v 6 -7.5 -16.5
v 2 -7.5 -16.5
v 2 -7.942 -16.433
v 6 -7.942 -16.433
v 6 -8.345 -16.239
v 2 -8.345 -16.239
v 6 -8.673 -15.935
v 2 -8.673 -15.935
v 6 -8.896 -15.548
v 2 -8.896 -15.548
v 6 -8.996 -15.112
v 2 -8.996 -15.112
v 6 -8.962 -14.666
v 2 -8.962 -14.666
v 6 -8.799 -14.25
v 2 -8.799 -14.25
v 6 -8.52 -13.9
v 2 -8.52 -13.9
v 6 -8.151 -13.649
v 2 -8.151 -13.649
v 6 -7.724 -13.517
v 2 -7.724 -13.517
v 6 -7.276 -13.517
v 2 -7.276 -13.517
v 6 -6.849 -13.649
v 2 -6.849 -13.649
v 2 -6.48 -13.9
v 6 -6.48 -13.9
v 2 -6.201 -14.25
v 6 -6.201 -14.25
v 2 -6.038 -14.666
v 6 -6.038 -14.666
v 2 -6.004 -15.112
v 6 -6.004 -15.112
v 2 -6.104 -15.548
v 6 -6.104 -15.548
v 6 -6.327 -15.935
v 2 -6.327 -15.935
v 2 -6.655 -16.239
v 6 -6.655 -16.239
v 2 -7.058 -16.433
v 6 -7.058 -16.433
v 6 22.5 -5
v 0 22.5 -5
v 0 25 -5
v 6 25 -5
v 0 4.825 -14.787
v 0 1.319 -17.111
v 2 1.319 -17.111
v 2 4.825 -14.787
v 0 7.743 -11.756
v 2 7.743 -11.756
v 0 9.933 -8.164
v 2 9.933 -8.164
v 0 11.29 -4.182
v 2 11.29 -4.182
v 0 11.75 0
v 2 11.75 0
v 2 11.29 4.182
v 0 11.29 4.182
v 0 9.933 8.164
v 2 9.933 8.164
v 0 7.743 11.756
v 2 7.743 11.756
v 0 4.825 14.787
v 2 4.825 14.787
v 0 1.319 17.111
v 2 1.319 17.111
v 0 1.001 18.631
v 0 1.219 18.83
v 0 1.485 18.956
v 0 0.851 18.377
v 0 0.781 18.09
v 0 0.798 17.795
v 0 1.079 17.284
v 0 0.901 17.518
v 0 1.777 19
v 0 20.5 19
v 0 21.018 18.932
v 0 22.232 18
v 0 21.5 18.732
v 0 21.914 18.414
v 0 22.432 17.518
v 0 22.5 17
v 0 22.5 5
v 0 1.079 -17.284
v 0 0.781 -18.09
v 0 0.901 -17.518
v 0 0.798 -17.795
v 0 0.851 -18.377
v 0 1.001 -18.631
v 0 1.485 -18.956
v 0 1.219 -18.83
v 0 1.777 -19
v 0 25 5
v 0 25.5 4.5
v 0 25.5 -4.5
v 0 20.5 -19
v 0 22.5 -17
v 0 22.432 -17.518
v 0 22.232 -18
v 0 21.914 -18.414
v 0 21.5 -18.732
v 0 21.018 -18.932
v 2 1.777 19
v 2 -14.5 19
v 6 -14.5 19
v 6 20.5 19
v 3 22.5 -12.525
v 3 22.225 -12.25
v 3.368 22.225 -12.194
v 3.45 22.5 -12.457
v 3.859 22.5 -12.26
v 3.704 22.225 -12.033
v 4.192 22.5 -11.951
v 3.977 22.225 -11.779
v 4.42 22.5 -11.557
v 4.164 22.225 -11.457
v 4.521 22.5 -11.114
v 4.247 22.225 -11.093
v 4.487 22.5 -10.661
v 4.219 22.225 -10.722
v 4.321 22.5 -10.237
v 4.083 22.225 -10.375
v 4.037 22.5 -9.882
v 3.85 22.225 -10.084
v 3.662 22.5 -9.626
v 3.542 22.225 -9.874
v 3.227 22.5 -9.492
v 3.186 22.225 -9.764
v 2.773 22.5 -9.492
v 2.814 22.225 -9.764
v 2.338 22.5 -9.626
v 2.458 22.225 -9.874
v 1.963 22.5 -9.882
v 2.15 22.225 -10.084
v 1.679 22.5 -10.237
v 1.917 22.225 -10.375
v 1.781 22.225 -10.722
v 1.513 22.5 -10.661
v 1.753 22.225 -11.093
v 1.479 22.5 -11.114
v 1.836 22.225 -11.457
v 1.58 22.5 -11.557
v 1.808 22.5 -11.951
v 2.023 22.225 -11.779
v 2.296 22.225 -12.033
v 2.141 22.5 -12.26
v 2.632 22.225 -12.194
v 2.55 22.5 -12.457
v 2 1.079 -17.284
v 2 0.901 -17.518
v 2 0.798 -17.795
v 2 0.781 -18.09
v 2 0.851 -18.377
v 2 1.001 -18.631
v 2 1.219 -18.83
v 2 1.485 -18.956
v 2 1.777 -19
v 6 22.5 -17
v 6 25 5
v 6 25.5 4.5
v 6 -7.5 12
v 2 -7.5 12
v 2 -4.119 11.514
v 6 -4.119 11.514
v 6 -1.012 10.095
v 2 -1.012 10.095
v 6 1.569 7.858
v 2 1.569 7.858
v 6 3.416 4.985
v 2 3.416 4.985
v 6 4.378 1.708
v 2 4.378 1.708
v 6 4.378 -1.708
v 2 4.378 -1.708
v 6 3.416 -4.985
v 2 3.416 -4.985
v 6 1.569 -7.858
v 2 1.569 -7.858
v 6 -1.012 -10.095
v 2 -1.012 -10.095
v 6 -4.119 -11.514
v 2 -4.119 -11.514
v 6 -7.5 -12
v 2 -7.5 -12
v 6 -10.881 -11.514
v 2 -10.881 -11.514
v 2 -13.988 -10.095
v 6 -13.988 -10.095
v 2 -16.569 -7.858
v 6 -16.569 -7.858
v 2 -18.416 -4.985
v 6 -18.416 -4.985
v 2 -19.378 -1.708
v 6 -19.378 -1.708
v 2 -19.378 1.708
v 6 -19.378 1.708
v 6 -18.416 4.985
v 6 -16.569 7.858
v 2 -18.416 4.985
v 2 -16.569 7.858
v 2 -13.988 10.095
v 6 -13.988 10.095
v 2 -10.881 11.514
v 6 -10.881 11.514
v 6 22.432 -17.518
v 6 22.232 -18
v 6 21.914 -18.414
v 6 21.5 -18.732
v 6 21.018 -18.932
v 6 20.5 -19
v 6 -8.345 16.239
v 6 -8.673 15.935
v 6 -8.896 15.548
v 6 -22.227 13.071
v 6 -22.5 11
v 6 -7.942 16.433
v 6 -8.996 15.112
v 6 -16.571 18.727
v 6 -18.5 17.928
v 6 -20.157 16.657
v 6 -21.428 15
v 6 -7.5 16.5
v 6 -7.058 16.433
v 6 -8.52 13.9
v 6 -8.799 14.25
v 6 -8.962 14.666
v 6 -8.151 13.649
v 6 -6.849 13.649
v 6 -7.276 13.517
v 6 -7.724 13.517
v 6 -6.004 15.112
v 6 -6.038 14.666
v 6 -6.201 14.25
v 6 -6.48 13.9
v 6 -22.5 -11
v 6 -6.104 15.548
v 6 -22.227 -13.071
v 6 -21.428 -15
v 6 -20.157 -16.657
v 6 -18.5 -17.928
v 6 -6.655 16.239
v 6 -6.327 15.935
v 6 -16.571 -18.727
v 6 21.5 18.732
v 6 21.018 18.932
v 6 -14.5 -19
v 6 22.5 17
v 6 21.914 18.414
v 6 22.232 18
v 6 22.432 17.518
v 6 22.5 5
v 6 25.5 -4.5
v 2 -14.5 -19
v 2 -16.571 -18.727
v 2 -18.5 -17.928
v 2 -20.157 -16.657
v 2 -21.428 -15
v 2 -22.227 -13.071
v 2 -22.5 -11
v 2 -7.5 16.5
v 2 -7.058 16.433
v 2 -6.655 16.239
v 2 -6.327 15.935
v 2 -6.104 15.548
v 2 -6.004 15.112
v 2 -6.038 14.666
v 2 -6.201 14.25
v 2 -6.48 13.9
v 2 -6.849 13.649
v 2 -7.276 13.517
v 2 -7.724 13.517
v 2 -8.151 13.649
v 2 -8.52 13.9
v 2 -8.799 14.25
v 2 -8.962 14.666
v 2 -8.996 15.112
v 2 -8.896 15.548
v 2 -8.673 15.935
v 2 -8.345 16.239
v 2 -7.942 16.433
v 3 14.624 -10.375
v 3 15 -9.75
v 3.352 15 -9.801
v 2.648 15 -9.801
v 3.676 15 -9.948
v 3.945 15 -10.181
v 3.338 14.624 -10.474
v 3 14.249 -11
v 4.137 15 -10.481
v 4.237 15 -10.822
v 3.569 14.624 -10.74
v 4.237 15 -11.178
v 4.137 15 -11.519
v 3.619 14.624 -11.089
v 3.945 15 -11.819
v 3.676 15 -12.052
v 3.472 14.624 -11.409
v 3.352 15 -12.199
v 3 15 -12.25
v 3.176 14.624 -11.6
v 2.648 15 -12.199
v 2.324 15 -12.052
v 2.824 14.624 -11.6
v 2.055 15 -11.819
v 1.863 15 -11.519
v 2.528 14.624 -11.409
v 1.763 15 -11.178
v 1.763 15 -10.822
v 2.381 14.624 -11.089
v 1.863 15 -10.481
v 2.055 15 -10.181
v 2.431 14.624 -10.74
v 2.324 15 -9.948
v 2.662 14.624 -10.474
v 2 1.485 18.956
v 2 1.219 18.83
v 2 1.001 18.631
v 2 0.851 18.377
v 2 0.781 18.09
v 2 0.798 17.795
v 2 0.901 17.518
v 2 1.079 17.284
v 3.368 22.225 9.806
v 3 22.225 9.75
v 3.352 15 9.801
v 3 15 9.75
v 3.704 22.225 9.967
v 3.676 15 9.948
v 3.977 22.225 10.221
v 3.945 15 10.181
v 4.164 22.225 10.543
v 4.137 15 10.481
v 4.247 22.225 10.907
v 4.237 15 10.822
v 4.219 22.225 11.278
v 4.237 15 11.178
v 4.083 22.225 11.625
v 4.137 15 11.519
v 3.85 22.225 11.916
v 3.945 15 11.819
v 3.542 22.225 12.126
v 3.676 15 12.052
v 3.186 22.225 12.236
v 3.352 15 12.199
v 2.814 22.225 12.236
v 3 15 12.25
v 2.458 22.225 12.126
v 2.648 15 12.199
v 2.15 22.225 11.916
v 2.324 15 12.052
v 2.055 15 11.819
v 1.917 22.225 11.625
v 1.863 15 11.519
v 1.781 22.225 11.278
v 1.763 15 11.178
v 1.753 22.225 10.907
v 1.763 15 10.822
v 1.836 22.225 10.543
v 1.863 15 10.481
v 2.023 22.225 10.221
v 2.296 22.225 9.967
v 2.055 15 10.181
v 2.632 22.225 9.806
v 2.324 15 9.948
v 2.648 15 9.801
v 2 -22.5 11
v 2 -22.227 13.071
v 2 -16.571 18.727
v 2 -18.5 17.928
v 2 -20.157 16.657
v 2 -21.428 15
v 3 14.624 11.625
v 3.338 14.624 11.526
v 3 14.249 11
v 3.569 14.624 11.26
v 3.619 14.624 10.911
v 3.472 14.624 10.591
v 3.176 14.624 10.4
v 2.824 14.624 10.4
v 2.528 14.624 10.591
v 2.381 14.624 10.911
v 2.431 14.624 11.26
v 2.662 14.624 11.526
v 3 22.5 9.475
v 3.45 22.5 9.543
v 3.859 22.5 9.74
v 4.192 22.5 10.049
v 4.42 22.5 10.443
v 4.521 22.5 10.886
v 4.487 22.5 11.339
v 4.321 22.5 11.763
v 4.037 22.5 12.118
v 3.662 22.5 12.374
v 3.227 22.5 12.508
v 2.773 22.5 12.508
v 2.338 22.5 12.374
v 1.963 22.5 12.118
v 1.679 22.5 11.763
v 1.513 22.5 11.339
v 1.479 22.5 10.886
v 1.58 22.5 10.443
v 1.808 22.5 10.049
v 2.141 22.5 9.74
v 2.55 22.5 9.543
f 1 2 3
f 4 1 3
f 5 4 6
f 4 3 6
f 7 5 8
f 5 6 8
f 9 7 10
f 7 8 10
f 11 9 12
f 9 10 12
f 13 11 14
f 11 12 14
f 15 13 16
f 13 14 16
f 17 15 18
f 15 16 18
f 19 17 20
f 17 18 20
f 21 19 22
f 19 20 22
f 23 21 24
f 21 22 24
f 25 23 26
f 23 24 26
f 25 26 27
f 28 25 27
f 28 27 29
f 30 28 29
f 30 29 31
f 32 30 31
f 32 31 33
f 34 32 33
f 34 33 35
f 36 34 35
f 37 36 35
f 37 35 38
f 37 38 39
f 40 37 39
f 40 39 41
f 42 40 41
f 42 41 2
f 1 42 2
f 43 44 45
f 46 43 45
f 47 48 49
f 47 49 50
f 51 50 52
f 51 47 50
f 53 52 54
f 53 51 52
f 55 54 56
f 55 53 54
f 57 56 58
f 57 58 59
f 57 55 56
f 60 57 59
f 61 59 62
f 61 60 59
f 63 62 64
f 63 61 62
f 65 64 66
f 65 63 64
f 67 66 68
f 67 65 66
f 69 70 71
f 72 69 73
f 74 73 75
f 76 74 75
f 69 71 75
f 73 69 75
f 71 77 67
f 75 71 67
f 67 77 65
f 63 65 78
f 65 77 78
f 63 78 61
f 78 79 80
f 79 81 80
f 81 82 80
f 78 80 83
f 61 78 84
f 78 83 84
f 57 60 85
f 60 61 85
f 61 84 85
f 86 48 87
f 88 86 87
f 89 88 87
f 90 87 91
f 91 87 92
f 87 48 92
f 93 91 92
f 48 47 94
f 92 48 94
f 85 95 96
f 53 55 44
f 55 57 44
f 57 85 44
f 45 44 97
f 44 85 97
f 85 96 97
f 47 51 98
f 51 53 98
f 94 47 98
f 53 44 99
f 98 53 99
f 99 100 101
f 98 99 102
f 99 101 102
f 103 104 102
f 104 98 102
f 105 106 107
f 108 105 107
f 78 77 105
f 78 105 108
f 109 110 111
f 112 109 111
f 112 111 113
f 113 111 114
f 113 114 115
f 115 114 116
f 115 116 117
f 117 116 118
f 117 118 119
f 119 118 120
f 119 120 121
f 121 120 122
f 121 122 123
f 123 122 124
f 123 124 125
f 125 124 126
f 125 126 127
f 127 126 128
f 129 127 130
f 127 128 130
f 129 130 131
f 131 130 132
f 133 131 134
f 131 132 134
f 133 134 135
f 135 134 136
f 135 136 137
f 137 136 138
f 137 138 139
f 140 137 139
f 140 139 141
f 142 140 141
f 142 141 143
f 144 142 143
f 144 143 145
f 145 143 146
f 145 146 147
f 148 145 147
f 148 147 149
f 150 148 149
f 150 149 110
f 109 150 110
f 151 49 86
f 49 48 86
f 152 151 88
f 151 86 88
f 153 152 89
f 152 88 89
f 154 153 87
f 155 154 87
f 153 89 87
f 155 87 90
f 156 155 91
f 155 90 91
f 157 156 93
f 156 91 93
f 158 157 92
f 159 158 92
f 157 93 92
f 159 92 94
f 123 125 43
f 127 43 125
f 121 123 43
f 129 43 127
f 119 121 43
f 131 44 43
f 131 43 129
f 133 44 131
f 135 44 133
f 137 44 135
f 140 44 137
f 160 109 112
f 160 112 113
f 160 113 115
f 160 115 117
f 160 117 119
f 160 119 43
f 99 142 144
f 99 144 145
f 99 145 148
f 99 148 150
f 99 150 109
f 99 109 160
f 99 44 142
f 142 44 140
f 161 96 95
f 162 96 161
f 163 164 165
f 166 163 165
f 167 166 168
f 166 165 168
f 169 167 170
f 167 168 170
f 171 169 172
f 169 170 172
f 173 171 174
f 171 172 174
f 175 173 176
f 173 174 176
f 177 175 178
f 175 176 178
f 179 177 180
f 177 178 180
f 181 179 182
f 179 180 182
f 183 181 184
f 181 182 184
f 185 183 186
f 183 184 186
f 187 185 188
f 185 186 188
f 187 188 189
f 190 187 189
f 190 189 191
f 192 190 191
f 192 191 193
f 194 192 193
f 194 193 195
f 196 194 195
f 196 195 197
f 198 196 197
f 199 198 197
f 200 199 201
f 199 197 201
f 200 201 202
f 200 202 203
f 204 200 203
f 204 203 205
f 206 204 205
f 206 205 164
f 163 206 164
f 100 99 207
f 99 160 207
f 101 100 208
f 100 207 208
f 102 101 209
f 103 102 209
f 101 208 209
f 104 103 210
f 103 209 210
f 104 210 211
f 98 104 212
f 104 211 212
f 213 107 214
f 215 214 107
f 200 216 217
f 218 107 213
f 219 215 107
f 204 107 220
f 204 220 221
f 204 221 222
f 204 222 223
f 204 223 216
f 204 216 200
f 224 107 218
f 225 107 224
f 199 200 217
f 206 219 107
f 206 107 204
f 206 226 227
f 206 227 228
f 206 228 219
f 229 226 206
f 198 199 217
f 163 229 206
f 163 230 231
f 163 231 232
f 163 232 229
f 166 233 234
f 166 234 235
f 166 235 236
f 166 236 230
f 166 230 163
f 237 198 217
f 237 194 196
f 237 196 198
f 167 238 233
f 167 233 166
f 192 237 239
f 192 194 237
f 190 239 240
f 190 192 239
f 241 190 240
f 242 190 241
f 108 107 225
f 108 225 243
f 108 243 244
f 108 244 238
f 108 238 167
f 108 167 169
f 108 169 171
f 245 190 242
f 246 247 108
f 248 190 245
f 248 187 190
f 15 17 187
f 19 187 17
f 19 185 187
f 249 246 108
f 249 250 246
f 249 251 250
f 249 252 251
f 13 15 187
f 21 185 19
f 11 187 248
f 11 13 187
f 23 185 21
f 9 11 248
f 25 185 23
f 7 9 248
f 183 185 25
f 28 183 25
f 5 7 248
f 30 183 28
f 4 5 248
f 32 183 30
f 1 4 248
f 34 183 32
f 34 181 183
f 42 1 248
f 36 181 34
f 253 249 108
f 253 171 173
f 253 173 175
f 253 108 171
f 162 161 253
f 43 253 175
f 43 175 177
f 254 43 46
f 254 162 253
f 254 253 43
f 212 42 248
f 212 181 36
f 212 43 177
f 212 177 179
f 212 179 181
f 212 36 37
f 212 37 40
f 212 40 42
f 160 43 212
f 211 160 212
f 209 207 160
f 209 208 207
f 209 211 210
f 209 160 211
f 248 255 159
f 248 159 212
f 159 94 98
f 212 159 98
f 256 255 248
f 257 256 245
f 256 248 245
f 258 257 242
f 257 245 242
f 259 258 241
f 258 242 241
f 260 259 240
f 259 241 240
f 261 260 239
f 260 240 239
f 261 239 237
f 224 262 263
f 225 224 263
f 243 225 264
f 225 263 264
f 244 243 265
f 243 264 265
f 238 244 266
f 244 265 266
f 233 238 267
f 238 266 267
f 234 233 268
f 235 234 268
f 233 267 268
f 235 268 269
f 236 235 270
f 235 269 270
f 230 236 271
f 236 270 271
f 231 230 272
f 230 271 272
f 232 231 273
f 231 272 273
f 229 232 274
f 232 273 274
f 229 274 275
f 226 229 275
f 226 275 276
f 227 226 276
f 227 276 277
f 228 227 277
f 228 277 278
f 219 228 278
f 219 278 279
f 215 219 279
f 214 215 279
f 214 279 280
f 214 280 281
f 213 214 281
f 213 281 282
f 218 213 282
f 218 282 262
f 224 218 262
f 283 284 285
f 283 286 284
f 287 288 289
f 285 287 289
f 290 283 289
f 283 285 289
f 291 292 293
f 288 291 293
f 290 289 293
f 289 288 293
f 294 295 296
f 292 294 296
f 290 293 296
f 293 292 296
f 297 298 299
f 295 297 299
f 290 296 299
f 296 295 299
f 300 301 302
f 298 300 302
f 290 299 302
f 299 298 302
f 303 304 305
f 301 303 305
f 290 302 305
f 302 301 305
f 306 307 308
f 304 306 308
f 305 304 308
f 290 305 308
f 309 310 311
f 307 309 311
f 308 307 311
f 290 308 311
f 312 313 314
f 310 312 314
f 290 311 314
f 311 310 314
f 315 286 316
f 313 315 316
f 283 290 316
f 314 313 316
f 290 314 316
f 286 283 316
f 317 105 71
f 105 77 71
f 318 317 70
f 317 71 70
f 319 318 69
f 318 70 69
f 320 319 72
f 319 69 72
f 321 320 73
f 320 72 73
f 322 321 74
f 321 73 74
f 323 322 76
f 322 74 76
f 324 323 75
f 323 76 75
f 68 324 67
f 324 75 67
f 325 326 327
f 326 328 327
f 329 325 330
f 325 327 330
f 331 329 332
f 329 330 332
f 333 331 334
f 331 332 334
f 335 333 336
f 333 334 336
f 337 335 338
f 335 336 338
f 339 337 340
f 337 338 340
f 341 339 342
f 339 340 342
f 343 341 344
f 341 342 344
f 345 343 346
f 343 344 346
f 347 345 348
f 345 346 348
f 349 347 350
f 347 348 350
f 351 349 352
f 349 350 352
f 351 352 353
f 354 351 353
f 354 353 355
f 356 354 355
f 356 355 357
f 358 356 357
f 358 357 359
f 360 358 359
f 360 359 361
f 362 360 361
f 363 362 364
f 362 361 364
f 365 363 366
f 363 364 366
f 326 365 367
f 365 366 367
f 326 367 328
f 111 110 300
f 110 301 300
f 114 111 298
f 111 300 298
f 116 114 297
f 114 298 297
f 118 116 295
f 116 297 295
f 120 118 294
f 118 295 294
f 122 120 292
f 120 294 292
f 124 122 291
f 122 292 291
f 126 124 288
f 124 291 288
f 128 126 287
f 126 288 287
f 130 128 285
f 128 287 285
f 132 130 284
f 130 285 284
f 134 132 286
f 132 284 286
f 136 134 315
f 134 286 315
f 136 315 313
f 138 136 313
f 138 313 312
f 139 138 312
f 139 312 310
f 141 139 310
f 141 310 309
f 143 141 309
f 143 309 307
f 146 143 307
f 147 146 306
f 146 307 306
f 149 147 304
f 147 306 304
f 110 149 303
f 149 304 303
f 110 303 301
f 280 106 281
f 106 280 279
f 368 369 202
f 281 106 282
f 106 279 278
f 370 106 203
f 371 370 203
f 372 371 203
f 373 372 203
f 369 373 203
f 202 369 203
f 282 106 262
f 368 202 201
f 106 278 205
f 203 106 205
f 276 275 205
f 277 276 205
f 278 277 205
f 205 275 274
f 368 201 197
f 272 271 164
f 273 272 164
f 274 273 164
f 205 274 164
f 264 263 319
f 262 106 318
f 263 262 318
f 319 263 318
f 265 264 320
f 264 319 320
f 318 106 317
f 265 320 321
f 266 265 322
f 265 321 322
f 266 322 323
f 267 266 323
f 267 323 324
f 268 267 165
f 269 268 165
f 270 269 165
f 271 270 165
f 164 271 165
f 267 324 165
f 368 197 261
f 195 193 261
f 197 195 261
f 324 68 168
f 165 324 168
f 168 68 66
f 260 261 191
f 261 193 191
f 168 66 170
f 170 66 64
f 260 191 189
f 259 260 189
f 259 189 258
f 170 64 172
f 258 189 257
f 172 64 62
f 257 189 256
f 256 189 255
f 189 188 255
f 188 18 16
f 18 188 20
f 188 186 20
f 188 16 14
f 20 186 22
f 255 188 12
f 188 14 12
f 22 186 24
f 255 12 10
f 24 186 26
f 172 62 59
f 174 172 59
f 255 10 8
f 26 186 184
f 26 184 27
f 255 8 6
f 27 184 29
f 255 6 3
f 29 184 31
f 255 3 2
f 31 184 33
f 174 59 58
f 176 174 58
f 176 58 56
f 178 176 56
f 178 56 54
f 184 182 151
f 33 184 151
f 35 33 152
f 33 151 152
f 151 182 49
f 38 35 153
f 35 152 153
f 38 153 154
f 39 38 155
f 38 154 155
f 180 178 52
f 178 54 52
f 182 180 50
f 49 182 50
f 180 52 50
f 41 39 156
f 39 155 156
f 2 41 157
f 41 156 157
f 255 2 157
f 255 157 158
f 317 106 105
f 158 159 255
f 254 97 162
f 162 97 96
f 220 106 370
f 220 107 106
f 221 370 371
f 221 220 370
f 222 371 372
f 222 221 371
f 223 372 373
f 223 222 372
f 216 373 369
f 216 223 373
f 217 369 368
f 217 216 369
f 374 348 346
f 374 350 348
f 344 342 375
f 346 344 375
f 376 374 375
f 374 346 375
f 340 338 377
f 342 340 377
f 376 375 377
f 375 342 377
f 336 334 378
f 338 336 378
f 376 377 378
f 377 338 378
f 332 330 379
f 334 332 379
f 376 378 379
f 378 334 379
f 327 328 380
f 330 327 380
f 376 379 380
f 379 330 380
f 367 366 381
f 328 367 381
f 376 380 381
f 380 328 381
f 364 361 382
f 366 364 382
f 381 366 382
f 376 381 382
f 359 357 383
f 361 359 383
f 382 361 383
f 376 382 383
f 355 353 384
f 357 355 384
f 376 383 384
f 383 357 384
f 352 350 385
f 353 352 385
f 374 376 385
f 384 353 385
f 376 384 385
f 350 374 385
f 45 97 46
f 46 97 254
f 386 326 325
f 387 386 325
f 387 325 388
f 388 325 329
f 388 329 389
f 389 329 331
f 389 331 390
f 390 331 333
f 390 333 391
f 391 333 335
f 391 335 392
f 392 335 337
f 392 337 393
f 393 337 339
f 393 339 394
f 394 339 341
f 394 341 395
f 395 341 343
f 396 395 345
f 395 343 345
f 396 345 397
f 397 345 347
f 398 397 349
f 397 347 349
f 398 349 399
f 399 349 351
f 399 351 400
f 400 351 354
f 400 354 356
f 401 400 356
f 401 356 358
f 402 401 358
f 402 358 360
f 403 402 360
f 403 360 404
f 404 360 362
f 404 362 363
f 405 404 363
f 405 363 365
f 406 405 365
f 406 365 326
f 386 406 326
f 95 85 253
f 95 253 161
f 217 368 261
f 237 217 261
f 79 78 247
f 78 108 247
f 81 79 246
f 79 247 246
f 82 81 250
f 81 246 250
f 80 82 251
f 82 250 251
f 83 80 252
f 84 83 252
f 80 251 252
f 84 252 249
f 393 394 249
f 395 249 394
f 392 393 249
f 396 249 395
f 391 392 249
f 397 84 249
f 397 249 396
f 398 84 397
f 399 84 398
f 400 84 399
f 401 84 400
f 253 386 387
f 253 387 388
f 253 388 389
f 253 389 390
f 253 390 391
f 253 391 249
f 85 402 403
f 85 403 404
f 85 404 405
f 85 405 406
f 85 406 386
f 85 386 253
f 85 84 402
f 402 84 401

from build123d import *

# Parameters (mm, degrees)
SKETCH_1_W                   = 38
SKETCH_1_H                   = 45
EXTRUDE_1_DEPTH              = 6
SKETCH_2_R                   = 12
SKETCH_2_R_2                 = 1.5
CUT_EXTRUDE_1_DEPTH          = 31.054117854
CUT_EXTRUDE_2_DEPTH          = 2
FILLET_2_R                   = 1
FILLET_3_R                   = 8
FILLET_4_R                   = 2
SKETCH_4_W                   = 10
SKETCH_4_H                   = 3
EXTRUDE_2_DEPTH              = 6
CHAMFER_1_SIZE               = 0.5
HOLE_WIZARD_M3_1_D           = 2.5
HOLE_WIZARD_M3_1_DEPTH       = 7.5
HOLE_WIZARD_M3_1_CSINK_D     = 3.05
HOLE_WIZARD_M3_1_CSINK_ANGLE = 90
HOLE_WIZARD_M3_1_TIP         = 0.751075774


with BuildPart() as part:
    # 草图1 → 凸台-拉伸1 (new body)
    with BuildSketch(Plane(origin=(0, 0, 0), x_dir=(0, 0, -1), z_dir=(1, 0, 0))):
        Rectangle(SKETCH_1_W, SKETCH_1_H)
    extrude(amount=EXTRUDE_1_DEPTH)

    # 草图2 → 切除-拉伸1 (cut, through all)
    with BuildSketch(Plane.ZY):
        with Locations((0, -7.5)):
            Circle(SKETCH_2_R)
        with Locations((15, -7.5)):
            Circle(SKETCH_2_R_2)
        with Locations(Location((-15, -7.5, 0), (0, 0, 180))):
            Circle(SKETCH_2_R_2)
    extrude(amount=-CUT_EXTRUDE_1_DEPTH, mode=Mode.SUBTRACT)

    # 草图3 → 切除-拉伸2 (cut)
    with BuildSketch(Plane.ZY):
        with BuildLine():
            Line((19.25, -7.5), (19.25, -22.5))
            Line((19.25, -22.5), (-19.25, -22.5))
            Line((-19.25, -22.5), (-19.25, -7.5))
            ThreePointArc((-19.25, -7.5), (0, 11.75), (19.25, -7.5))
        make_face()
    extrude(amount=-CUT_EXTRUDE_2_DEPTH, mode=Mode.SUBTRACT)

    # 圆角2
    fillet_2_edges = [part.edges().sort_by_distance(p)[0] for p in [
        (1, -4.407670781, -19),
        (1, -4.407670781, 19),
    ]]
    fillet(fillet_2_edges, radius=FILLET_2_R)

    # 圆角3
    fillet_3_edges = [part.edges().sort_by_distance(p)[0] for p in [
        (4, -22.5, -19),
        (4, -22.5, 19),
    ]]
    fillet(fillet_3_edges, radius=FILLET_3_R)

    # 圆角4
    fillet_4_edges = [part.edges().sort_by_distance(p)[0] for p in [
        (3, 22.5, 19),
        (3, 22.5, -19),
    ]]
    fillet(fillet_4_edges, radius=FILLET_4_R)

    # 草图4 → 凸台-拉伸2 (add)
    with BuildSketch(Plane.ZY):
        with Locations((0, 24)):
            Rectangle(SKETCH_4_W, SKETCH_4_H)
    extrude(amount=-EXTRUDE_2_DEPTH)

    # 倒角1
    chamfer_1_edges = [part.edges().sort_by_distance(p)[0] for p in [
        (3, 25.5, 5),
        (3, 25.5, -5),
    ]]
    chamfer(chamfer_1_edges, length=CHAMFER_1_SIZE)

    # M3 螺纹孔1
    with Locations(Plane(origin=(3, 22.5, -11), x_dir=(0, 0, 1), z_dir=(0, 1, 0))):
        with Locations((0, 0), (22, 0)):
            CounterSinkHole(HOLE_WIZARD_M3_1_D / 2, HOLE_WIZARD_M3_1_CSINK_D / 2, depth=HOLE_WIZARD_M3_1_DEPTH, counter_sink_angle=HOLE_WIZARD_M3_1_CSINK_ANGLE)
            with Locations((0, 0, -(HOLE_WIZARD_M3_1_DEPTH + HOLE_WIZARD_M3_1_TIP / 2))):  # 118° drill point
                Cone(0, HOLE_WIZARD_M3_1_D / 2, HOLE_WIZARD_M3_1_TIP, mode=Mode.SUBTRACT)


solid = part.part
